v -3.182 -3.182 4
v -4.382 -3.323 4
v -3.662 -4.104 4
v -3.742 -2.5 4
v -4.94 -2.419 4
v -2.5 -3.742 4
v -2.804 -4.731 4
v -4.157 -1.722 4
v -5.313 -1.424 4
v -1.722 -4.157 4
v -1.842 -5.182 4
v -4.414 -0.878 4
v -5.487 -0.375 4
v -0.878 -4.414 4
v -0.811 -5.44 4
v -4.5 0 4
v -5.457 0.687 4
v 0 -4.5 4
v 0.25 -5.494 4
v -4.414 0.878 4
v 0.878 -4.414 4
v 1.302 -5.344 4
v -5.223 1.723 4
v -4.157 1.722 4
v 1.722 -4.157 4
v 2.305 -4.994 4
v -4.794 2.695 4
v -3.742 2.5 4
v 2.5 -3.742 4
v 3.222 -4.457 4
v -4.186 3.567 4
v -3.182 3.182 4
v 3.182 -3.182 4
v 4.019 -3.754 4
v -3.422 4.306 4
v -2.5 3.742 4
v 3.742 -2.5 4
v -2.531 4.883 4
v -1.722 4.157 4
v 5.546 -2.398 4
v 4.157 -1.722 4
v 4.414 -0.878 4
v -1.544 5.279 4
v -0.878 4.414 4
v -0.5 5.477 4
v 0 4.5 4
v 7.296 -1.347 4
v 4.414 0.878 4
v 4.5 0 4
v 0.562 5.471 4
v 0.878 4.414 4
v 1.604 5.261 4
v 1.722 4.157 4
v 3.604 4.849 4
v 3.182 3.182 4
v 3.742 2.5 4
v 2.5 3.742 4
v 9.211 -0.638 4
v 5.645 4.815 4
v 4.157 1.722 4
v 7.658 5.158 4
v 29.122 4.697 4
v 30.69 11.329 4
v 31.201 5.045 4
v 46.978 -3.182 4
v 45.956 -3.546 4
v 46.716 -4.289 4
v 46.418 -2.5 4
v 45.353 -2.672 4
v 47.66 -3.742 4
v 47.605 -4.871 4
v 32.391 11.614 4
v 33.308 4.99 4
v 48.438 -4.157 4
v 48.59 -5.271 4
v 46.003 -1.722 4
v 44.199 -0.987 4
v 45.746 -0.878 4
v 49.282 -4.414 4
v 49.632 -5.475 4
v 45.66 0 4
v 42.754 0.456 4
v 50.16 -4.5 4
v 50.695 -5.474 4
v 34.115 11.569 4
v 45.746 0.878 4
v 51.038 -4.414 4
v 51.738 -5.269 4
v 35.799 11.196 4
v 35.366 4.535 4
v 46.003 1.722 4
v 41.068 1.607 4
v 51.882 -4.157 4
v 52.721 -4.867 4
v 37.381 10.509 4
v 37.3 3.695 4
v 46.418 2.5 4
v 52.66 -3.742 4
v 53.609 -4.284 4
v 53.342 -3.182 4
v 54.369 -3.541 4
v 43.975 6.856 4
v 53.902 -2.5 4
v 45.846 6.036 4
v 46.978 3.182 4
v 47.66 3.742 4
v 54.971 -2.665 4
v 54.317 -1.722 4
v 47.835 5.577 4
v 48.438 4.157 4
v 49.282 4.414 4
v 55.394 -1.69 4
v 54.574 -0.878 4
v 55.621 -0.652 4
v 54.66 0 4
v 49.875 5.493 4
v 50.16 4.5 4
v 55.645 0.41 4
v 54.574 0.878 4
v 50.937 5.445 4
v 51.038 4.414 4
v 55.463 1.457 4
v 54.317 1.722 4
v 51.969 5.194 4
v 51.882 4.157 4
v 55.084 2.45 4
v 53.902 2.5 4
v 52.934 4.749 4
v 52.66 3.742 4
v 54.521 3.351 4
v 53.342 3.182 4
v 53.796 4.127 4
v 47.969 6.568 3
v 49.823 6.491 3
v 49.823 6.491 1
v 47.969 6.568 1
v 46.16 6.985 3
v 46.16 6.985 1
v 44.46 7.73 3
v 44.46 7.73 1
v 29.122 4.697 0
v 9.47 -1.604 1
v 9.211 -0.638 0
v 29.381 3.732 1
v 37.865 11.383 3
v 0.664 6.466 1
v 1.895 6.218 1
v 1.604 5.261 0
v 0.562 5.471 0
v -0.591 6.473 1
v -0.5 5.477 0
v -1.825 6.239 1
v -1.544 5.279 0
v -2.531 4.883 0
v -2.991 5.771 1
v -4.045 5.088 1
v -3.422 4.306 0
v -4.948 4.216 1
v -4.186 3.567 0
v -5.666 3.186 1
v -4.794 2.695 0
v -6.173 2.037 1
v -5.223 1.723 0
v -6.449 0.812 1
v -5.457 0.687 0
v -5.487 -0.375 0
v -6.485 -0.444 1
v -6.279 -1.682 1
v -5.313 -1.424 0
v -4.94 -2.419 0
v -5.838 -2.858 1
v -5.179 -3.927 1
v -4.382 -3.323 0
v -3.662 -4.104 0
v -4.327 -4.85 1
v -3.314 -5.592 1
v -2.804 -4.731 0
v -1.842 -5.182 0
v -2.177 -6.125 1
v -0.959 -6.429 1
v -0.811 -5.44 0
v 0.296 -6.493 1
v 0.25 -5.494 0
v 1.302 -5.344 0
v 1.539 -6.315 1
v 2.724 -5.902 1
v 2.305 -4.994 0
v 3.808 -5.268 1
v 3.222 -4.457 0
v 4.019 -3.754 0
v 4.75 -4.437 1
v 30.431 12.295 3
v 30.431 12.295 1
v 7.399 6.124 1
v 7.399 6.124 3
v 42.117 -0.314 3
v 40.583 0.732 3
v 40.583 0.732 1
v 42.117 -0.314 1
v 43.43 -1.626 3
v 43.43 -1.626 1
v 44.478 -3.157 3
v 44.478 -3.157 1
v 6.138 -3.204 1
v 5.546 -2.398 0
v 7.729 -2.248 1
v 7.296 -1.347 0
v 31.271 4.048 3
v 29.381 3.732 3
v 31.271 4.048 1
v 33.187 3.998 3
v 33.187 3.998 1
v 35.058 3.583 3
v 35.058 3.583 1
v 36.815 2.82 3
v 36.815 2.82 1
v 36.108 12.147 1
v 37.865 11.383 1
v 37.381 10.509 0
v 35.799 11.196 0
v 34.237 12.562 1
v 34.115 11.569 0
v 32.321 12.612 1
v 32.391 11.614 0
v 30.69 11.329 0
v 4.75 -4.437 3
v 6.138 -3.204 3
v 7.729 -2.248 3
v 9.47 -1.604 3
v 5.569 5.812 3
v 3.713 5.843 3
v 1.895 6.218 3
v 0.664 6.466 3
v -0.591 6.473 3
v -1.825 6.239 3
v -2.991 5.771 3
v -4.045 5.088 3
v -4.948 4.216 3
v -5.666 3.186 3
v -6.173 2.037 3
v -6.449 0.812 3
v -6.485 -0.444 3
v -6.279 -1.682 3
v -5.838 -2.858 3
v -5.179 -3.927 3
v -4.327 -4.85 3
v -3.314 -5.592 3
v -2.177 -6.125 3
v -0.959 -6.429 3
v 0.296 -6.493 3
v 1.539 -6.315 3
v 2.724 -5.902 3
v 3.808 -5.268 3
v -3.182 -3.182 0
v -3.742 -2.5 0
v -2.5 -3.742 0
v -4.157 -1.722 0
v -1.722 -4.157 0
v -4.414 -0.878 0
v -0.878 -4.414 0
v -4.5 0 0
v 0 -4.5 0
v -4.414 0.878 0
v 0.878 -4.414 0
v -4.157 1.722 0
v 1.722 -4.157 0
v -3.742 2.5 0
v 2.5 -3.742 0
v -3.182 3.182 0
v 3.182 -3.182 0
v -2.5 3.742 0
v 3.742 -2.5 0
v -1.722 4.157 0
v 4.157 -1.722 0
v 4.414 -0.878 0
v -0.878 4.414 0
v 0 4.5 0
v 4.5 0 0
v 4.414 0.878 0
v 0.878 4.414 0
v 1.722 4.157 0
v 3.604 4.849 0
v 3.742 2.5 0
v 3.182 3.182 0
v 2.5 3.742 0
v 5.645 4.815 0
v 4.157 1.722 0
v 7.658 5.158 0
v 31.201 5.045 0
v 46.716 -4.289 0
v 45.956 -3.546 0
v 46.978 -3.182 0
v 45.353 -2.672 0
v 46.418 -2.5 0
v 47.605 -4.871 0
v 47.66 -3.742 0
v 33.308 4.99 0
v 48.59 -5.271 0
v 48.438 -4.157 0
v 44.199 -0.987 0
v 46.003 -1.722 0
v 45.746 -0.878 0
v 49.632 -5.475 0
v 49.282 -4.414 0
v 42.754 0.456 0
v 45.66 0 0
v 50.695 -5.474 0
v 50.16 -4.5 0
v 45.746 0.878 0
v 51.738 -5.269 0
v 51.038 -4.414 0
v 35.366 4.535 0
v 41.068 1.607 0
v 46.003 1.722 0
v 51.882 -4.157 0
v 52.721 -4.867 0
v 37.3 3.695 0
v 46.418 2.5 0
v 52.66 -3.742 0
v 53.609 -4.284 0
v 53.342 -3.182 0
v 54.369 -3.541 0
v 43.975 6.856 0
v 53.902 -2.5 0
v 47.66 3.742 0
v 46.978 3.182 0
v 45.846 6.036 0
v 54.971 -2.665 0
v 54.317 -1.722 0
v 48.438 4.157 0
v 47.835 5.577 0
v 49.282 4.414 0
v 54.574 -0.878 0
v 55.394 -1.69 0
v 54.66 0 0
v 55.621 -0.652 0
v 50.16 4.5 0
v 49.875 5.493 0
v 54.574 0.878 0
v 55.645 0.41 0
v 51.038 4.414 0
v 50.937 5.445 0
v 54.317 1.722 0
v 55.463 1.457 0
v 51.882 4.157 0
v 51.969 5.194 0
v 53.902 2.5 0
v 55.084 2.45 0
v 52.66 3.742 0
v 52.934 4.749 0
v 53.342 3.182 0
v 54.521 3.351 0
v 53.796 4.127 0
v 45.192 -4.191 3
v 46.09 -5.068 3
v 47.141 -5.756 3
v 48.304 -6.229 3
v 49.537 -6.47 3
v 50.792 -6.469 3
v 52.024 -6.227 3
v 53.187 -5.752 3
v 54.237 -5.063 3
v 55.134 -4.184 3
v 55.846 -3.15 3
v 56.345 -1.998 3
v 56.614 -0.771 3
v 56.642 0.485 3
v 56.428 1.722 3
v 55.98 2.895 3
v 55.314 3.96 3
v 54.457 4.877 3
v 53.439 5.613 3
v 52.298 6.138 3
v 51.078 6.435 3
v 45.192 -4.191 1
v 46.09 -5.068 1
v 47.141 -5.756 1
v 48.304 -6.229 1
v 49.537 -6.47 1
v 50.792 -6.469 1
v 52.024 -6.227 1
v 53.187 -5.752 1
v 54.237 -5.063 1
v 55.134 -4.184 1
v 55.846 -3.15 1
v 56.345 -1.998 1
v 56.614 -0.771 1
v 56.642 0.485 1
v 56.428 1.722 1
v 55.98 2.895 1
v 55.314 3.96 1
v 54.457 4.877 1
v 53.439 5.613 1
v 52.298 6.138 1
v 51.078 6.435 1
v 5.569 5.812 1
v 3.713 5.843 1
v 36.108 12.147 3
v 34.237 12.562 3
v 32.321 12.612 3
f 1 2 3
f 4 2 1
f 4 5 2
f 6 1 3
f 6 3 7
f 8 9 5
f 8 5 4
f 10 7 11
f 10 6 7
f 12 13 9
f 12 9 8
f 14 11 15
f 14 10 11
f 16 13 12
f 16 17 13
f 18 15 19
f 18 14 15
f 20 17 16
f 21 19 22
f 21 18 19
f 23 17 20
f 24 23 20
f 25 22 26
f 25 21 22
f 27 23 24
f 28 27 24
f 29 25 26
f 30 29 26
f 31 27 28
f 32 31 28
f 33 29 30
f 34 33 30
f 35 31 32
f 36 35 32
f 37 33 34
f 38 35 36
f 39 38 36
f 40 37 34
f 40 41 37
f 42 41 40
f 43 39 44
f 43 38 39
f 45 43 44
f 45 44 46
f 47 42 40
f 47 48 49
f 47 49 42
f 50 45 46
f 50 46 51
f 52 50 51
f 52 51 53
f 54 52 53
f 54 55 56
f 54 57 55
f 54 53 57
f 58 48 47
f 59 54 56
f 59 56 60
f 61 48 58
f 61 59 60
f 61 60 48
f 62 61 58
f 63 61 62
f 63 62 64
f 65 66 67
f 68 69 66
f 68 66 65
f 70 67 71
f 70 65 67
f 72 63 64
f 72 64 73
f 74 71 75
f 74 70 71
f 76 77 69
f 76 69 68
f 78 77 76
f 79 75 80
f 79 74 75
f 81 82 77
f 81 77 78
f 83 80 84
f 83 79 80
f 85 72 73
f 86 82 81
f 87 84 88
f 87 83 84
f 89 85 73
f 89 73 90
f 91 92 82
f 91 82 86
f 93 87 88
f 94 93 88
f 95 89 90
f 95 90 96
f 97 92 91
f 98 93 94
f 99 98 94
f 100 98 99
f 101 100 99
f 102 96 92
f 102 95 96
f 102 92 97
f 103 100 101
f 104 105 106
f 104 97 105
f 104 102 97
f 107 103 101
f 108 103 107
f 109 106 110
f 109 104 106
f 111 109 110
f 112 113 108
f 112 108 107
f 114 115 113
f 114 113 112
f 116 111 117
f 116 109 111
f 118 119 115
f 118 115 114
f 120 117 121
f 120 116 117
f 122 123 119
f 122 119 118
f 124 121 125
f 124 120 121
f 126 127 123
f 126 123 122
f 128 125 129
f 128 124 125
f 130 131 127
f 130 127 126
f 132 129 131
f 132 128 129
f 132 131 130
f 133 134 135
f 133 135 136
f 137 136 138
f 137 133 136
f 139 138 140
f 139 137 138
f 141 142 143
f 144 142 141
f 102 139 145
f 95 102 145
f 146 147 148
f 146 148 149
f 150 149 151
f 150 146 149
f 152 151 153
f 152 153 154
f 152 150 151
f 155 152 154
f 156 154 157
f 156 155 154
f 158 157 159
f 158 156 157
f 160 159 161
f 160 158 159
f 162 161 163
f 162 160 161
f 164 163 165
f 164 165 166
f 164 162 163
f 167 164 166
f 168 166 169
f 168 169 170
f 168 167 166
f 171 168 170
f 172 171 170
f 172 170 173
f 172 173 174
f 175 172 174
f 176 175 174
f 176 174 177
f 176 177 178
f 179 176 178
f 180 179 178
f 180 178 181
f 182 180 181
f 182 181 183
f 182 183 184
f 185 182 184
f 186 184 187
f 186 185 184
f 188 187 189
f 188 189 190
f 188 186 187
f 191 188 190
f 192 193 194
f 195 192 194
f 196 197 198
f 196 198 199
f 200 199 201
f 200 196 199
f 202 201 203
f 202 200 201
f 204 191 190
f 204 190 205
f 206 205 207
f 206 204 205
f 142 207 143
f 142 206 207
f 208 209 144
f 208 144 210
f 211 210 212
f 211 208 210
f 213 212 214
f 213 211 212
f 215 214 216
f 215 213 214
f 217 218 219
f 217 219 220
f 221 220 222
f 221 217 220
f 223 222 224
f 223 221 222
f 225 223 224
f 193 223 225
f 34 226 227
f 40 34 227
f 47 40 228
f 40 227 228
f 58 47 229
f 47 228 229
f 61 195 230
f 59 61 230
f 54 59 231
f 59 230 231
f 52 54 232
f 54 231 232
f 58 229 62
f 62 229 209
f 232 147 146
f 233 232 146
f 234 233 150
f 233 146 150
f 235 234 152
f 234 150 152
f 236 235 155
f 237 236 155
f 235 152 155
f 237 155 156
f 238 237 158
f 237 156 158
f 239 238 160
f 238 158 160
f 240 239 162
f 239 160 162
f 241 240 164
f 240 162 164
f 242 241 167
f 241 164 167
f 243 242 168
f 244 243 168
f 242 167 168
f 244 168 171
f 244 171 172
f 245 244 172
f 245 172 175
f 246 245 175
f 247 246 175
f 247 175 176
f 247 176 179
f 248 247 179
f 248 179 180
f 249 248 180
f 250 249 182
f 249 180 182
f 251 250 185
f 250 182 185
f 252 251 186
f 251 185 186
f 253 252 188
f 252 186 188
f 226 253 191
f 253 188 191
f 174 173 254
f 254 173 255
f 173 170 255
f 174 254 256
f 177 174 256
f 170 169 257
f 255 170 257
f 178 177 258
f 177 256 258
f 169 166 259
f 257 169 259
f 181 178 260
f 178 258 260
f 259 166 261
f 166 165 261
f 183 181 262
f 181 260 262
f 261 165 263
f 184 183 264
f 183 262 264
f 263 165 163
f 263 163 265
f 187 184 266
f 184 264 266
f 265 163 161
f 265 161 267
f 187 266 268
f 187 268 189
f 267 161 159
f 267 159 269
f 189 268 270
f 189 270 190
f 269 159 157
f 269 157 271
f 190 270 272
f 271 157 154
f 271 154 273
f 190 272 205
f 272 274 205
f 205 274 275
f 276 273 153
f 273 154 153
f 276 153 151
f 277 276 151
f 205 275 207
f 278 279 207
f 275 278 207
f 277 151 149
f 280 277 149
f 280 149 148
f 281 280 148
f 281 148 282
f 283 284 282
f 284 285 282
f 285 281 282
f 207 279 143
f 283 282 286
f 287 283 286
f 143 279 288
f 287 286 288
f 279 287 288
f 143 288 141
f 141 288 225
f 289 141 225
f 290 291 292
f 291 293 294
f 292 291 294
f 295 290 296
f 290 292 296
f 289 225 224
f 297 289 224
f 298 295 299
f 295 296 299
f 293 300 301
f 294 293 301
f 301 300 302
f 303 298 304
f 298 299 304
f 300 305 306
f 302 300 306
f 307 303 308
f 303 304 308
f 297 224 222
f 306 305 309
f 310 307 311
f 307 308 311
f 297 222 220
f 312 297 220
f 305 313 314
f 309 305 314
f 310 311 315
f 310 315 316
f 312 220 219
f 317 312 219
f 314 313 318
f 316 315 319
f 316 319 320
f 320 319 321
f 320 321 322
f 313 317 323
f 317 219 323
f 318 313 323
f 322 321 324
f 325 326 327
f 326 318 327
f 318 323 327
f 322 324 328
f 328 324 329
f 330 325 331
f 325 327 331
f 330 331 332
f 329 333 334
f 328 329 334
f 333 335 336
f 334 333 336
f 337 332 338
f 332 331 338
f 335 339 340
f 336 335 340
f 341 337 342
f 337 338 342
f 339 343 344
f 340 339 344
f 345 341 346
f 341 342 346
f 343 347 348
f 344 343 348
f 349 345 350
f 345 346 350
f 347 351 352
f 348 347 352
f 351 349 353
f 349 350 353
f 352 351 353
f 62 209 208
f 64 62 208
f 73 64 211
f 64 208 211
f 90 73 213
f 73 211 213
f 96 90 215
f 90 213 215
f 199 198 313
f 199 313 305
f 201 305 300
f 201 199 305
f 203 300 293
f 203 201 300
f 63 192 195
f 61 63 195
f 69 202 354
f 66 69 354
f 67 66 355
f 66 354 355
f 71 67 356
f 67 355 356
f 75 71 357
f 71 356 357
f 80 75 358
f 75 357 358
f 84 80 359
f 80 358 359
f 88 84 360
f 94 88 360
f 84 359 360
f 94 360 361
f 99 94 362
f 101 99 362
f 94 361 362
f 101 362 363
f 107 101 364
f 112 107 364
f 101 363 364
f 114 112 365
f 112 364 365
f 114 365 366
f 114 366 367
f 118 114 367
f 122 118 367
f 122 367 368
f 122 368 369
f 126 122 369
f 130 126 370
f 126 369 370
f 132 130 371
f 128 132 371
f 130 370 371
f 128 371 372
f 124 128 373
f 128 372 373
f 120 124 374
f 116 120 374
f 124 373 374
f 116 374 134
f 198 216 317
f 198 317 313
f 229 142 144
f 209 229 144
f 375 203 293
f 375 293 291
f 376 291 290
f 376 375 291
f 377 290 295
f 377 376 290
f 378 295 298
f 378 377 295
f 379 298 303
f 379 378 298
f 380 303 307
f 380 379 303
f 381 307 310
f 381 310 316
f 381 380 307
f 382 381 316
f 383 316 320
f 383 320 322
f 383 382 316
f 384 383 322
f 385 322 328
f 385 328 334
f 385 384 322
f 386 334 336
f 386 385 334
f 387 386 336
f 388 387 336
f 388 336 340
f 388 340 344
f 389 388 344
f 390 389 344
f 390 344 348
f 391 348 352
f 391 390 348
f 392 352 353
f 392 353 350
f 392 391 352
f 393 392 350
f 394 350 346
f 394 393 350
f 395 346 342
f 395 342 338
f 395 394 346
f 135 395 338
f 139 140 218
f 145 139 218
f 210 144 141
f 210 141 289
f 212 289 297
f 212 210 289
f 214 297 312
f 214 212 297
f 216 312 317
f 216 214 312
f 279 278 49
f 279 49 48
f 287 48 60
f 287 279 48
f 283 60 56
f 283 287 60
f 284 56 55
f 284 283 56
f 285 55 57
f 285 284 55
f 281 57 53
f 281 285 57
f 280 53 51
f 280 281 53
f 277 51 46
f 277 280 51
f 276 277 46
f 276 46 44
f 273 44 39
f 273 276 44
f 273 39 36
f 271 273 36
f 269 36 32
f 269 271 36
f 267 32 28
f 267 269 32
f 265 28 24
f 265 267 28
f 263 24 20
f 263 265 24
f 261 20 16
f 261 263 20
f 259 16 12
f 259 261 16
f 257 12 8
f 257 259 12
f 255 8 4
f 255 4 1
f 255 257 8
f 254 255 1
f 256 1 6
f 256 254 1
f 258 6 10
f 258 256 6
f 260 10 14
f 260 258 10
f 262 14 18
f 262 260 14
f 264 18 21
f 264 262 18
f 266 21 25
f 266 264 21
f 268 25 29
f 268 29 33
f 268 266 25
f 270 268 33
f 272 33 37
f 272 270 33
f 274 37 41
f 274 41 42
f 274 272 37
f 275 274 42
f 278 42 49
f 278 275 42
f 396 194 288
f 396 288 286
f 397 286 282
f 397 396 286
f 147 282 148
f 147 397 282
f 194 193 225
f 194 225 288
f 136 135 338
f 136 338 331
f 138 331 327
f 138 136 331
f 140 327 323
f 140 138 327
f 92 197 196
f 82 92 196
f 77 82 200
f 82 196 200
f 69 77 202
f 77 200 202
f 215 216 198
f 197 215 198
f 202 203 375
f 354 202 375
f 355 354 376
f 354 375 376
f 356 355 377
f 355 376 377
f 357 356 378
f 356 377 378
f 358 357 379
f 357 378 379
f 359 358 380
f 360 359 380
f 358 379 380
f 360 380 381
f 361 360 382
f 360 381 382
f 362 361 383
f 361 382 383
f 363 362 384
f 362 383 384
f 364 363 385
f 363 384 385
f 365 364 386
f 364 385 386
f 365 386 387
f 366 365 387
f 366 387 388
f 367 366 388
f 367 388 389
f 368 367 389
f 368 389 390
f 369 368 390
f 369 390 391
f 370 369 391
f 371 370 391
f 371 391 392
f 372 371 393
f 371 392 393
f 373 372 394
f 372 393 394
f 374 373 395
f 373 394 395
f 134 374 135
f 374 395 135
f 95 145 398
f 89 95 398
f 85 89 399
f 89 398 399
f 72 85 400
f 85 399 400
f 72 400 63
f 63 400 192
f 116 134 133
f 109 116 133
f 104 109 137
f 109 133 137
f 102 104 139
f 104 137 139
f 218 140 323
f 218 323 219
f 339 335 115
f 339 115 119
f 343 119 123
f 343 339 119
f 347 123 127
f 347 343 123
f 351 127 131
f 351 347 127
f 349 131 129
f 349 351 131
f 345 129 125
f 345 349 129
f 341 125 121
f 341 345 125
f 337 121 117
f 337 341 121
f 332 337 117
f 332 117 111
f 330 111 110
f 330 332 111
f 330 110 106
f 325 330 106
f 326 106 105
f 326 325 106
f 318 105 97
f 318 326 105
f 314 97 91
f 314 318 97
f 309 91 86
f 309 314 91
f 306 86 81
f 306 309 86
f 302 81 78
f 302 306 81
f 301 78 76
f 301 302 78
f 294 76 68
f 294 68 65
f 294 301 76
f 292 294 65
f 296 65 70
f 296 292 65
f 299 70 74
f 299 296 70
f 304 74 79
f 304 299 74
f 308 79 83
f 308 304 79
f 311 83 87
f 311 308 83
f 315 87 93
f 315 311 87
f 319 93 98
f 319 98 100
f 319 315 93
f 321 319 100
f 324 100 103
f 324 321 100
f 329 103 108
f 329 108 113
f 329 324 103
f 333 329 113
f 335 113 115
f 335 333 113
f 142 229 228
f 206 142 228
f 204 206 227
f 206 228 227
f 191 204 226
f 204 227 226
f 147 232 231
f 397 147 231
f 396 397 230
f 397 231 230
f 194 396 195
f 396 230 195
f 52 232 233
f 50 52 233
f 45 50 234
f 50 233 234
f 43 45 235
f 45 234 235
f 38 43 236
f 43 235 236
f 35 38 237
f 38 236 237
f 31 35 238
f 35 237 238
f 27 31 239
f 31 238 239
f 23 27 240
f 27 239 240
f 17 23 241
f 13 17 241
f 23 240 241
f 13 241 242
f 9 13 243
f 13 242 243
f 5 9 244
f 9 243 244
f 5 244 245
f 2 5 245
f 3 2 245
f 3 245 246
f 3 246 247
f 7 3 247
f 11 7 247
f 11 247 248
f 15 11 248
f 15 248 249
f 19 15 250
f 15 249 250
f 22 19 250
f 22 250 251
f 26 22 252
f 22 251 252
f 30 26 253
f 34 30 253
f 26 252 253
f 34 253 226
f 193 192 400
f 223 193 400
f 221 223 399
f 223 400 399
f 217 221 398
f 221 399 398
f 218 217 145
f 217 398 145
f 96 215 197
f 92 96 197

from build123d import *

# Parameters (mm, degrees)
SKETCH1_R           = 4.5
BOSS_EXTRUDE1_DEPTH = 4
FILLET1_R           = 10
CHAMFER2_SIZE       = 1


with BuildPart() as part:
    # Sketch1 → Boss-Extrude1 (new body)
    with BuildSketch(Plane.XY):
        with BuildLine():
            Line((5.984173373, -2.537650299), (33.282244564, 4.776845831))
            Line((33.282244564, 4.776845831), (43.739940984, -1.016288457))
            ThreePointArc((43.739940984, -1.016288457), (55.845872024, -3.149739565), (47.616543526, 5.98170788))
            Line((47.616543526, 5.98170788), (34.332563277, 13.340487326))
            Line((34.332563277, 13.340487326), (3.913621012, 5.189756311))
            ThreePointArc((3.913621012, 5.189756311), (-6.278517871, -1.682323793), (5.984173373, -2.537650299))
        make_face()
        Circle(SKETCH1_R, mode=Mode.SUBTRACT)
        with Locations((50.16, 0)):
            Circle(SKETCH1_R, mode=Mode.SUBTRACT)
    extrude(amount=BOSS_EXTRUDE1_DEPTH)

    # Fillet1
    fillet1_edges = [part.edges().sort_by_distance(p)[0] for p in [
        (33.282244564, 4.776845831, 2),
        (5.984173373, -2.537650299, 2),
        (3.913621012, 5.189756311, 2),
        (34.332563277, 13.340487326, 2),
        (47.616543526, 5.98170788, 2),
        (43.739940984, -1.016288457, 2),
    ]]
    fillet(fillet1_edges, radius=FILLET1_R)

    # Chamfer2
    chamfer2_edges = [part.edges().sort_by_distance(p)[0] for p in [
        (38.699188042, 1.776081634, 0),
        (38.699188042, 1.776081634, 4),
        (19.425508285, 1.063944536, 0),
        (19.425508285, 1.063944536, 4),
        (18.915391461, 9.209468588, 0),
        (18.915391461, 9.209468588, 4),
        (-6.278517871, -1.682323793, 0),
        (41.16264867, 9.55690055, 0),
        (55.845872024, -3.149739565, 0),
        (34.237028938, 12.561560111, 0),
        (41.16264867, 9.55690055, 4),
        (55.845872024, -3.149739565, 4),
        (-6.278517871, -1.682323793, 4),
        (34.237028938, 12.561560111, 4),
        (33.186710225, 3.997918617, 0),
        (33.186710225, 3.997918617, 4),
        (6.91120565, -2.689125301, 0),
        (6.91120565, -2.689125301, 4),
        (47.054714022, 6.734490138, 0),
        (47.054714022, 6.734490138, 4),
        (42.803779737, -0.939245365, 0),
        (42.803779737, -0.939245365, 4),
        (4.640717013, 5.784453649, 0),
        (4.640717013, 5.784453649, 4),
    ]]
    chamfer(chamfer2_edges, length=CHAMFER2_SIZE)


solid = part.part
